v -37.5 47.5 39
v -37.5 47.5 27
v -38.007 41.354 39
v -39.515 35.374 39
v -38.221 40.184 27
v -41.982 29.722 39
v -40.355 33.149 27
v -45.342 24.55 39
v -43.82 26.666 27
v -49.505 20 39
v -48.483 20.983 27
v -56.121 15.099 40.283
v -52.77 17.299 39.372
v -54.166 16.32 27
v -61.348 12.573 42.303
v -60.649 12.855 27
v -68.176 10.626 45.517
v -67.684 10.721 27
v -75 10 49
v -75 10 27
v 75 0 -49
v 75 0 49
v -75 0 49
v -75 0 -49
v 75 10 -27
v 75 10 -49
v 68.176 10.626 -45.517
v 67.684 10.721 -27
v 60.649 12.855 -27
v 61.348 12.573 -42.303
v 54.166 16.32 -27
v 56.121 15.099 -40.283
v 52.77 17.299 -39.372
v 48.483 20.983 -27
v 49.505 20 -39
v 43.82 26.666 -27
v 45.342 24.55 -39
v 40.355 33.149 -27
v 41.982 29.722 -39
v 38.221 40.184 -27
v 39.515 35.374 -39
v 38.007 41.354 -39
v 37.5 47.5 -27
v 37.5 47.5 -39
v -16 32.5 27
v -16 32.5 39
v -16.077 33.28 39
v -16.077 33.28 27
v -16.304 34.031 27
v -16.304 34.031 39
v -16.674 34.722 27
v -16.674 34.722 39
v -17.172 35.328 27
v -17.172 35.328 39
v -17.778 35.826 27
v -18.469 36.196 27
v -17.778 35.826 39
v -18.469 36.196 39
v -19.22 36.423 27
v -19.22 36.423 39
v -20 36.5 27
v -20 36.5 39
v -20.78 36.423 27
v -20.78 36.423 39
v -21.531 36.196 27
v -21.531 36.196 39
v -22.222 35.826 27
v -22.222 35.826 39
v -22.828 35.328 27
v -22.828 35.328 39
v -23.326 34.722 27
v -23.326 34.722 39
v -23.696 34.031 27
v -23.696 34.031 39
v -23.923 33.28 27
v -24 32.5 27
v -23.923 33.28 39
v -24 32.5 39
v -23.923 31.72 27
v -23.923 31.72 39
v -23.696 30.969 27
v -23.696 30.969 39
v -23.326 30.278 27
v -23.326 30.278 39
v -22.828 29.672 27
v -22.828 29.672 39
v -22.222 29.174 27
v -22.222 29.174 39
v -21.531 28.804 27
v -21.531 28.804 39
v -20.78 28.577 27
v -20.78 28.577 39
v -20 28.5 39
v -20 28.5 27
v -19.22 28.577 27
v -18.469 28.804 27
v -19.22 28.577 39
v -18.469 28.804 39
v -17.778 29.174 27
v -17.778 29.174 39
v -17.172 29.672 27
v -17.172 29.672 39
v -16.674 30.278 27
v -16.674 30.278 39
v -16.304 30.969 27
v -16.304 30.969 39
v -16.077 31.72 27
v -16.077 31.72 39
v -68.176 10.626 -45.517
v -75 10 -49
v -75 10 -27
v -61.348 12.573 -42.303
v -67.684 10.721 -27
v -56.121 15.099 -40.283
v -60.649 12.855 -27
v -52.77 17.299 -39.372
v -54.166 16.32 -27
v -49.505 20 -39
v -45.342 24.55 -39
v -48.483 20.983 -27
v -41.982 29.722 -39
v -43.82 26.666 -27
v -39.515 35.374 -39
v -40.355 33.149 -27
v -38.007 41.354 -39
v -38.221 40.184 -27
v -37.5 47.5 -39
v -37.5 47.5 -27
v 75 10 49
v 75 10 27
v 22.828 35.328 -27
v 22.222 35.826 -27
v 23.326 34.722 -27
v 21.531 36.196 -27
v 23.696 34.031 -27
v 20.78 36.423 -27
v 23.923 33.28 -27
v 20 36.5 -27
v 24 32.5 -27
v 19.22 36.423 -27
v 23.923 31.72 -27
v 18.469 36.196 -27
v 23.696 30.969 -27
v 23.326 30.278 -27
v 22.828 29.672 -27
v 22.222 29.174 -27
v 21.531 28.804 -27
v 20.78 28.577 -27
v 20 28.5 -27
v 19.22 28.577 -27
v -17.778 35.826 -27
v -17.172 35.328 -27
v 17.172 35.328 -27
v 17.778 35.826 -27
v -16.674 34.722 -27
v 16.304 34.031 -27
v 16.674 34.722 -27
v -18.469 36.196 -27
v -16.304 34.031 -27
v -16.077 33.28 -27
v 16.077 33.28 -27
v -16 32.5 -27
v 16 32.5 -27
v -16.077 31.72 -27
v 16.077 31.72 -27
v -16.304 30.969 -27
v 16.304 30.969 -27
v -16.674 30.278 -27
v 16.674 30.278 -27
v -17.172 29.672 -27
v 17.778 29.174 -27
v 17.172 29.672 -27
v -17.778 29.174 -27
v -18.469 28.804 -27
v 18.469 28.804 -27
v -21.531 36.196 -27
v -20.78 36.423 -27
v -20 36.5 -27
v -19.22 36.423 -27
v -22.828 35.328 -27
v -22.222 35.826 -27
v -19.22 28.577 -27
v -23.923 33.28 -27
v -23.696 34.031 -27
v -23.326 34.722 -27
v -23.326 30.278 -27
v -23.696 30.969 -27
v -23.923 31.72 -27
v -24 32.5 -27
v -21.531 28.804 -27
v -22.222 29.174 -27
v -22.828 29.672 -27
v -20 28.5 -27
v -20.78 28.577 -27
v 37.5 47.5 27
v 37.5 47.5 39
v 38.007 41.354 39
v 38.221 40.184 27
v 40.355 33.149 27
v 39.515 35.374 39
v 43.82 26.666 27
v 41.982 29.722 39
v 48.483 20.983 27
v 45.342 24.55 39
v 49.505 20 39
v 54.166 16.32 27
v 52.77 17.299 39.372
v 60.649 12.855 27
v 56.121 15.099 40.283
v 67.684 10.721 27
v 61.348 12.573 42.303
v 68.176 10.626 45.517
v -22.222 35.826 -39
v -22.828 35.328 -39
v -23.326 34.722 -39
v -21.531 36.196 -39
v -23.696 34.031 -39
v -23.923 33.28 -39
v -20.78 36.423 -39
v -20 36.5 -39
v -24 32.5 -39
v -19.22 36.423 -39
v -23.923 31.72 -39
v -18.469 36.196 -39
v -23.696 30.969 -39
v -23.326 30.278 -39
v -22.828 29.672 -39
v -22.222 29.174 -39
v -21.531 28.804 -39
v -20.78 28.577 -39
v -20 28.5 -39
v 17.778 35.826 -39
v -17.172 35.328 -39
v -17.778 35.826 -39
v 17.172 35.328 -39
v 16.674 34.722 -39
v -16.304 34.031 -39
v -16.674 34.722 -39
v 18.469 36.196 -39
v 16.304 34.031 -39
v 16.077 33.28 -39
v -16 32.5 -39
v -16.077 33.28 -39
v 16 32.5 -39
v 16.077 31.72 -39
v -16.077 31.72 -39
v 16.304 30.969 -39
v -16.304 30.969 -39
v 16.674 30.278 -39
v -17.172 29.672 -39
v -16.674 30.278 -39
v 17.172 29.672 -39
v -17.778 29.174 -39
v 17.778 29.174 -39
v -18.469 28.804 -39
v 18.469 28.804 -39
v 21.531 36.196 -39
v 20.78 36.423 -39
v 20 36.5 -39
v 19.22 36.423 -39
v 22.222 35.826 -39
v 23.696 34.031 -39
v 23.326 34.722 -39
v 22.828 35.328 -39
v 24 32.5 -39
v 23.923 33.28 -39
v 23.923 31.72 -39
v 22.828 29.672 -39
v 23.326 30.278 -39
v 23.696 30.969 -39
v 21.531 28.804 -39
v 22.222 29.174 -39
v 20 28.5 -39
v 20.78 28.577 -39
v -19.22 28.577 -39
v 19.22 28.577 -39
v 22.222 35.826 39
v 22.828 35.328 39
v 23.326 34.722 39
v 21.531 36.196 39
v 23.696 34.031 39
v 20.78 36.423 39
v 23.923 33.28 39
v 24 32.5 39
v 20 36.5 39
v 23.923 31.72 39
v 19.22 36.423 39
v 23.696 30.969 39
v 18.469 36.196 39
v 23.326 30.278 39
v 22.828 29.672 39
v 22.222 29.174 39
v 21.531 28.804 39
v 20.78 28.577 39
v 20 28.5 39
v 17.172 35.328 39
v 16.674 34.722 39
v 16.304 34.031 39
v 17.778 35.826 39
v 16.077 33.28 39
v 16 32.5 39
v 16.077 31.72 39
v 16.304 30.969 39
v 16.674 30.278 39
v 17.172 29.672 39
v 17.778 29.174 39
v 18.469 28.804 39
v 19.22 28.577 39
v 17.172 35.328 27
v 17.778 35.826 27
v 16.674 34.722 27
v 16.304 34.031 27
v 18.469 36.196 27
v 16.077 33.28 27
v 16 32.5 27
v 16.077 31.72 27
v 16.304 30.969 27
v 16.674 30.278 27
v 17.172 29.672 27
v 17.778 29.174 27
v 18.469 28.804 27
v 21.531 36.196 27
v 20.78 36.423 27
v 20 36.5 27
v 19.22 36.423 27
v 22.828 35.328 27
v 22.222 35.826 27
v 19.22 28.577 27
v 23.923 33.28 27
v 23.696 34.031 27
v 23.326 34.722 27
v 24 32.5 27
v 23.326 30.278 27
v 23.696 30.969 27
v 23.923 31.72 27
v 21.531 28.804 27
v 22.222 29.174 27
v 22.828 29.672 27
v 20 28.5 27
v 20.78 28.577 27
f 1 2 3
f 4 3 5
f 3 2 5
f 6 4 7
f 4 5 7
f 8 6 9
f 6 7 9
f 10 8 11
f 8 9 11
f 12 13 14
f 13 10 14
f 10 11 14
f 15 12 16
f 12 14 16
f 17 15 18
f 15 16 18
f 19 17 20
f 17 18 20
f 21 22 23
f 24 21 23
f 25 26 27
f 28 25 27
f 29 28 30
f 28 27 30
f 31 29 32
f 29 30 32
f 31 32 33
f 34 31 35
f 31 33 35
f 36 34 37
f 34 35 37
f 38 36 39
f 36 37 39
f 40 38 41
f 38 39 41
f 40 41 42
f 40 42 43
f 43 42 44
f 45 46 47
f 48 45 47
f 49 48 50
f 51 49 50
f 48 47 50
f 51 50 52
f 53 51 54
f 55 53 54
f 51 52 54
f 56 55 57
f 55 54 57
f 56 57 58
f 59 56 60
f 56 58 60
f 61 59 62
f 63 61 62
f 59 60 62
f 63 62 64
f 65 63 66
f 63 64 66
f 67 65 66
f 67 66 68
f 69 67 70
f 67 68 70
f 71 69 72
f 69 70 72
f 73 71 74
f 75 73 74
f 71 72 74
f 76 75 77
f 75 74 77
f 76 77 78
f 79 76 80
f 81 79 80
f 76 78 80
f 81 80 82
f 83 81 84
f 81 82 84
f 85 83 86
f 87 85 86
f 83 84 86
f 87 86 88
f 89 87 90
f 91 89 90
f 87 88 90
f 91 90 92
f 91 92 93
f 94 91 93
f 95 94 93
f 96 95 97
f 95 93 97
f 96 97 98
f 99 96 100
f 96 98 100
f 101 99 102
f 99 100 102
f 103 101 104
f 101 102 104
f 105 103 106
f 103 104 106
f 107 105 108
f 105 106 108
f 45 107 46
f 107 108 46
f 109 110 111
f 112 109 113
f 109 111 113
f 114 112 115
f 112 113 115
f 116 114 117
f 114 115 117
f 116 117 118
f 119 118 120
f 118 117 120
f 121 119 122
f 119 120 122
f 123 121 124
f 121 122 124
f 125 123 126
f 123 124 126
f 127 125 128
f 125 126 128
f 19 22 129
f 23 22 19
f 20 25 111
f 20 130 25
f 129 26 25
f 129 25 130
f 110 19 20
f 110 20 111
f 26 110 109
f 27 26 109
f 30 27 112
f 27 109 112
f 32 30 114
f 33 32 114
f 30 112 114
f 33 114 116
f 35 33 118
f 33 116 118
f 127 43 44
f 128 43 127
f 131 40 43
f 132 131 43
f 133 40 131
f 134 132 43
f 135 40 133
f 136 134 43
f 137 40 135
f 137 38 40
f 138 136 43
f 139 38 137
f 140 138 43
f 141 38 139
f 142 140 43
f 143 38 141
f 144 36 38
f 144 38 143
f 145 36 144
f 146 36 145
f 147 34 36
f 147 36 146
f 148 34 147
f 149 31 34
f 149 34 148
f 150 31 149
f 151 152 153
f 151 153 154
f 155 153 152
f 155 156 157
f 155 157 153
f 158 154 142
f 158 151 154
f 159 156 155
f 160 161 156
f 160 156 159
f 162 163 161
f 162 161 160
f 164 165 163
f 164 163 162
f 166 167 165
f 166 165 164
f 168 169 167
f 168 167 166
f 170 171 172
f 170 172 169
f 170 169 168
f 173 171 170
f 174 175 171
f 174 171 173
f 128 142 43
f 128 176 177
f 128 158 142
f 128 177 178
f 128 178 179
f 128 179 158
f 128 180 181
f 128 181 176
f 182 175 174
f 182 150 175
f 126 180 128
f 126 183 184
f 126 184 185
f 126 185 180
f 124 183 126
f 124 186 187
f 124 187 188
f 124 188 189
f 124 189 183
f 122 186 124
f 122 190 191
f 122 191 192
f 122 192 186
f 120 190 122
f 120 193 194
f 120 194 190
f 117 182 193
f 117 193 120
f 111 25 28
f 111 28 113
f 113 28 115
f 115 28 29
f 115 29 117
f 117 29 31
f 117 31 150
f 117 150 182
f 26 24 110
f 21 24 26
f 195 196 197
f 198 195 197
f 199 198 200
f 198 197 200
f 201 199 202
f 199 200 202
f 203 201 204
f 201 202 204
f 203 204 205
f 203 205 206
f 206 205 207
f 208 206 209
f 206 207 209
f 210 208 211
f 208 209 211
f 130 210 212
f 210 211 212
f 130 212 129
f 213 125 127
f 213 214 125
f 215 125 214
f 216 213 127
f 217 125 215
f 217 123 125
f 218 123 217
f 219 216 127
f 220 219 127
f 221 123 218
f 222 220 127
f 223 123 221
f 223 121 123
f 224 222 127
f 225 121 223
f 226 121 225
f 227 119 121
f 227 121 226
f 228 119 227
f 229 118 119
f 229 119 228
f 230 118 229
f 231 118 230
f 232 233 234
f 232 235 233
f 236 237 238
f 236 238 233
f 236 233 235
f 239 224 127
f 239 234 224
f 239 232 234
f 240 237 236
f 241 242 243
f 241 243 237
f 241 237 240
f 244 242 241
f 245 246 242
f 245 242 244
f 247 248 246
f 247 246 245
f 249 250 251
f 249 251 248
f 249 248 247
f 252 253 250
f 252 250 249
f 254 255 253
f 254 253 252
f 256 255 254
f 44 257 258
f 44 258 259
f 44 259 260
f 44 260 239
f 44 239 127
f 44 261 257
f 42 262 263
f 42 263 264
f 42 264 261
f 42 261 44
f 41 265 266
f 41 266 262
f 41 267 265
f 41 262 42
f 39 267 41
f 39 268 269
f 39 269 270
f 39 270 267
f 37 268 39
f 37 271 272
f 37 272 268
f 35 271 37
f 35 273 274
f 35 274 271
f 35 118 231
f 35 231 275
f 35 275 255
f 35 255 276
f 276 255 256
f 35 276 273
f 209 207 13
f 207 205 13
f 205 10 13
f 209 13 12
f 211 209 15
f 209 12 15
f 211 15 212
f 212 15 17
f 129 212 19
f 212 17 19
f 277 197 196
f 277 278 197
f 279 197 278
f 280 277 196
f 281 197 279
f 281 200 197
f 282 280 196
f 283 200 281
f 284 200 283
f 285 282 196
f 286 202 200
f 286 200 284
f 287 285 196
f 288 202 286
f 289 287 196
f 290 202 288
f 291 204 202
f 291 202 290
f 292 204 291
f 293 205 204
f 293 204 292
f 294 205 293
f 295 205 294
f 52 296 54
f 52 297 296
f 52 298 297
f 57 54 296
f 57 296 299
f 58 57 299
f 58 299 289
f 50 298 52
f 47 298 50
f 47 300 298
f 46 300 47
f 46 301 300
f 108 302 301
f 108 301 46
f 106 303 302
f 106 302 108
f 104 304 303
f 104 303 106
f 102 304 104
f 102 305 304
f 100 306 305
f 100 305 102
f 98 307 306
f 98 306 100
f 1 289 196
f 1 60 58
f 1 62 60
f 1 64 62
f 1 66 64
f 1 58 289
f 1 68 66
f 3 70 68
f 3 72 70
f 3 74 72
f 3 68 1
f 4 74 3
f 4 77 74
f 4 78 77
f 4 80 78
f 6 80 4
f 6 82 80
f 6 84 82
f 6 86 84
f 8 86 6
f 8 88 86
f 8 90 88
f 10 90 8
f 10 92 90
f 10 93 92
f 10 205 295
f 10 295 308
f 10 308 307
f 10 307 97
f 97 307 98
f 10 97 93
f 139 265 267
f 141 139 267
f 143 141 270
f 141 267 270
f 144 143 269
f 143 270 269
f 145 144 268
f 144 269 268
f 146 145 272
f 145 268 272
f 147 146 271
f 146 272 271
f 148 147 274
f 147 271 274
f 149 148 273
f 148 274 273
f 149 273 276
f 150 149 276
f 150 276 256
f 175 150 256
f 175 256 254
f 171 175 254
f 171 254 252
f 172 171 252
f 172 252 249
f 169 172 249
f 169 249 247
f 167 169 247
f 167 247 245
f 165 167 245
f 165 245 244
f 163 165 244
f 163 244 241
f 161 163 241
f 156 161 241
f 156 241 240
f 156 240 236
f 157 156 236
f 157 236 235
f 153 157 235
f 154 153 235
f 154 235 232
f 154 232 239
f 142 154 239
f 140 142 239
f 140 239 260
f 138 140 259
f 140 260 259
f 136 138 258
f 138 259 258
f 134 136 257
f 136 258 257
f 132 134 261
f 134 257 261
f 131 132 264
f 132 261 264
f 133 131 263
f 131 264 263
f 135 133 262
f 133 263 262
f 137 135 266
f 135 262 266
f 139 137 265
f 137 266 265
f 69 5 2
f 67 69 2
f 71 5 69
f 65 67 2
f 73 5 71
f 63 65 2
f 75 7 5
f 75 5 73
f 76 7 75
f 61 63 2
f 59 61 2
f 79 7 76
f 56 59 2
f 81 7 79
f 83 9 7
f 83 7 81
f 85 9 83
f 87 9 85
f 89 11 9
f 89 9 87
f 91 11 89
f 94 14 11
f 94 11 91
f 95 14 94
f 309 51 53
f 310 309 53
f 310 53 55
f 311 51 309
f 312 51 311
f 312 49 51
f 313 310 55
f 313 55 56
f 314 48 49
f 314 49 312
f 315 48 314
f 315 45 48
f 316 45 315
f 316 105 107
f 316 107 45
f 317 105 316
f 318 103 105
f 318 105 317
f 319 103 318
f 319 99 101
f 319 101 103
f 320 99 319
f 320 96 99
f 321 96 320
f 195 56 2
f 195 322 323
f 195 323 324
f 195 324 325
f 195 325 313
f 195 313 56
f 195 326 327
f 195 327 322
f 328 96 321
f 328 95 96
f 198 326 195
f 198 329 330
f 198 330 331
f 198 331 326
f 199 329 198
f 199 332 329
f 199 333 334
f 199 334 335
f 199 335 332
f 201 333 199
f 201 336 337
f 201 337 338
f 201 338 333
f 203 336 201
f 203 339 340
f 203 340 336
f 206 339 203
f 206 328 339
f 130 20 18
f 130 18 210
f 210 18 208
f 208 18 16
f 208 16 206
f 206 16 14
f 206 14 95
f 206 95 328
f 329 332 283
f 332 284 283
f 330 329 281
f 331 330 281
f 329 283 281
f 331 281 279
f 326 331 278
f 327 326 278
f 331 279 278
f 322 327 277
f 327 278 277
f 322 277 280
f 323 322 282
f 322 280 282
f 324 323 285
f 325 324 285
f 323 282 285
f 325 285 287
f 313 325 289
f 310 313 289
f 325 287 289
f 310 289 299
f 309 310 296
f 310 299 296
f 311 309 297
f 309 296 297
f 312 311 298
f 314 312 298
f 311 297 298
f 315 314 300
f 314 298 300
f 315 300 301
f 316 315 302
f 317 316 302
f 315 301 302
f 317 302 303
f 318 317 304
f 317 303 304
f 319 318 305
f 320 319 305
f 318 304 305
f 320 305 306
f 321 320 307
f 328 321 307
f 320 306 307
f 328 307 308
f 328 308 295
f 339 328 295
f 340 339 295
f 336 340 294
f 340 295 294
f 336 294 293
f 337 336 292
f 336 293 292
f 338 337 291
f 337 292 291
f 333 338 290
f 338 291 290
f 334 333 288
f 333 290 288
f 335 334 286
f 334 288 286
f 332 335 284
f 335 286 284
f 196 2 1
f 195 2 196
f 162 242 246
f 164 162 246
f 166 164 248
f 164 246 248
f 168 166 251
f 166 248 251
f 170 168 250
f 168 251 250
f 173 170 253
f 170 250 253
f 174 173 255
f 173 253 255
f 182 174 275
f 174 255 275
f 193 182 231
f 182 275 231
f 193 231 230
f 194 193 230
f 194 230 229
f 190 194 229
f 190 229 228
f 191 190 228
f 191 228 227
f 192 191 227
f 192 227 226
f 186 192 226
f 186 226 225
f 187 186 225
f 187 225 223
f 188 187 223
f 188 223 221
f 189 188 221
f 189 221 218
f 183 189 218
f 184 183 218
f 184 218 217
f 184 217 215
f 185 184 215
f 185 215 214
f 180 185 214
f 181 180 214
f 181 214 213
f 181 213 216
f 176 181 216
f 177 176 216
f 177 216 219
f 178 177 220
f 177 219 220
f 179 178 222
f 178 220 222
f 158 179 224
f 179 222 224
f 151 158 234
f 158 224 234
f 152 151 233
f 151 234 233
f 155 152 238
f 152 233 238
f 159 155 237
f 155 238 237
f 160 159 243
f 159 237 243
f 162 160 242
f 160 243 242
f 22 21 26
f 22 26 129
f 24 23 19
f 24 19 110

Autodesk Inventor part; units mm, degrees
ref_plane "YZ Plane" through (0, 0, 0) normal (1, 0, 0) x (0, 1, 0)
ref_plane "XZ Plane" through (0, 0, 0) normal (0, 1, 0) x (-1, 0, 0)
ref_plane "XY Plane" through (0, 0, 0) normal (0, 0, 1) x (1, 0, 0)
sketch "Sketch1" plane through (0, 0, 0) normal (0, 1, 0) x (-1, 0, 0)
  line L0 (75, 49) -> (75, -49)
  line L1 (75, -49) -> (-75, -49)
  line L2 (-75, -49) -> (-75, 49)
  line L3 (-75, 49) -> (75, 49)
  point P0 (0, 0)
  dimension "d0" = 98
  dimension "d1" = 150
  dimension "d2" = 75
  dimension "d3" = 49
extrude "Extrusion1" add sketch "Sketch1" along normal blind 10
sketch "Sketch2" plane through (0, 10, 0) normal (0, 1, 0) x (1, 0, 0)
  line L0 (-37.5, -39) -> (-37.5, -27)
  line L1 (-37.5, -27) -> (37.5, -27)
  line L2 (37.5, -27) -> (37.5, -39)
  line L3 (37.5, -39) -> (-37.5, -39)
  line L4 (-75, -49) -> (75, -49) projected
  point P0 (0, 0)
  point P1 (-37.5, -33)
  dimension "d6" = 12
  dimension "d8" = 37.5
  dimension "d9" = 75
  dimension "d14" = 33
extrude "Extrusion2" add sketch "Sketch2" along normal blind 37.5
fillet "Face Fillet3" radius 10 1 edges at (0, 10, 39)
sketch "Sketch3" plane through (-37.5, 47.5, 39) normal (0, 0, 1) x (1, 0, 0)
  circle A0 centre (17.5, -15) radius 4
  circle A1 centre (57.5, -15) radius 4
  line L0 (-37.5, -47.5) -> (112.5, -47.5) projected
  line L1 (0, 0) -> (75, 0) projected
  point P0 (37.5, -47.5)
  point P1 (37.5, 0)
  dimension "d16" = 8
  dimension "d17" = 8
  dimension "d18" = 32.5
  dimension "d19" = 32.5
  dimension "d20" = 40
  dimension "d21" = 20
fillet "Face Fillet4" radius 37.5 1 edges at (37.5, 10, 33)
fillet "Face Fillet5" radius 37.5 1 edges at (-37.5, 10, 33)
extrude "Extrusion3" cut sketch "Sketch3" against normal blind 80
mirror "Mirror1" about plane through (0, 0, 0) normal (0, 0, 1) of "Extrusion2", "Face Fillet3", "Face Fillet4", "Face Fillet5", "Extrusion3"
thread "Thread5" size "M8x1.25" class "6H" standard "ANSI Metric M Profile" length 350
thread "Thread6" size "M8x1.25" class "6H" standard "ANSI Metric M Profile" length 350
thread "Thread7" size "M8x1.25" class "6H" standard "ANSI Metric M Profile" length 350
thread "Thread8" size "M8x1.25" class "6H" standard "ANSI Metric M Profile" length 350
properties part number "Base Macaco" material "Steel AISI 1050"
